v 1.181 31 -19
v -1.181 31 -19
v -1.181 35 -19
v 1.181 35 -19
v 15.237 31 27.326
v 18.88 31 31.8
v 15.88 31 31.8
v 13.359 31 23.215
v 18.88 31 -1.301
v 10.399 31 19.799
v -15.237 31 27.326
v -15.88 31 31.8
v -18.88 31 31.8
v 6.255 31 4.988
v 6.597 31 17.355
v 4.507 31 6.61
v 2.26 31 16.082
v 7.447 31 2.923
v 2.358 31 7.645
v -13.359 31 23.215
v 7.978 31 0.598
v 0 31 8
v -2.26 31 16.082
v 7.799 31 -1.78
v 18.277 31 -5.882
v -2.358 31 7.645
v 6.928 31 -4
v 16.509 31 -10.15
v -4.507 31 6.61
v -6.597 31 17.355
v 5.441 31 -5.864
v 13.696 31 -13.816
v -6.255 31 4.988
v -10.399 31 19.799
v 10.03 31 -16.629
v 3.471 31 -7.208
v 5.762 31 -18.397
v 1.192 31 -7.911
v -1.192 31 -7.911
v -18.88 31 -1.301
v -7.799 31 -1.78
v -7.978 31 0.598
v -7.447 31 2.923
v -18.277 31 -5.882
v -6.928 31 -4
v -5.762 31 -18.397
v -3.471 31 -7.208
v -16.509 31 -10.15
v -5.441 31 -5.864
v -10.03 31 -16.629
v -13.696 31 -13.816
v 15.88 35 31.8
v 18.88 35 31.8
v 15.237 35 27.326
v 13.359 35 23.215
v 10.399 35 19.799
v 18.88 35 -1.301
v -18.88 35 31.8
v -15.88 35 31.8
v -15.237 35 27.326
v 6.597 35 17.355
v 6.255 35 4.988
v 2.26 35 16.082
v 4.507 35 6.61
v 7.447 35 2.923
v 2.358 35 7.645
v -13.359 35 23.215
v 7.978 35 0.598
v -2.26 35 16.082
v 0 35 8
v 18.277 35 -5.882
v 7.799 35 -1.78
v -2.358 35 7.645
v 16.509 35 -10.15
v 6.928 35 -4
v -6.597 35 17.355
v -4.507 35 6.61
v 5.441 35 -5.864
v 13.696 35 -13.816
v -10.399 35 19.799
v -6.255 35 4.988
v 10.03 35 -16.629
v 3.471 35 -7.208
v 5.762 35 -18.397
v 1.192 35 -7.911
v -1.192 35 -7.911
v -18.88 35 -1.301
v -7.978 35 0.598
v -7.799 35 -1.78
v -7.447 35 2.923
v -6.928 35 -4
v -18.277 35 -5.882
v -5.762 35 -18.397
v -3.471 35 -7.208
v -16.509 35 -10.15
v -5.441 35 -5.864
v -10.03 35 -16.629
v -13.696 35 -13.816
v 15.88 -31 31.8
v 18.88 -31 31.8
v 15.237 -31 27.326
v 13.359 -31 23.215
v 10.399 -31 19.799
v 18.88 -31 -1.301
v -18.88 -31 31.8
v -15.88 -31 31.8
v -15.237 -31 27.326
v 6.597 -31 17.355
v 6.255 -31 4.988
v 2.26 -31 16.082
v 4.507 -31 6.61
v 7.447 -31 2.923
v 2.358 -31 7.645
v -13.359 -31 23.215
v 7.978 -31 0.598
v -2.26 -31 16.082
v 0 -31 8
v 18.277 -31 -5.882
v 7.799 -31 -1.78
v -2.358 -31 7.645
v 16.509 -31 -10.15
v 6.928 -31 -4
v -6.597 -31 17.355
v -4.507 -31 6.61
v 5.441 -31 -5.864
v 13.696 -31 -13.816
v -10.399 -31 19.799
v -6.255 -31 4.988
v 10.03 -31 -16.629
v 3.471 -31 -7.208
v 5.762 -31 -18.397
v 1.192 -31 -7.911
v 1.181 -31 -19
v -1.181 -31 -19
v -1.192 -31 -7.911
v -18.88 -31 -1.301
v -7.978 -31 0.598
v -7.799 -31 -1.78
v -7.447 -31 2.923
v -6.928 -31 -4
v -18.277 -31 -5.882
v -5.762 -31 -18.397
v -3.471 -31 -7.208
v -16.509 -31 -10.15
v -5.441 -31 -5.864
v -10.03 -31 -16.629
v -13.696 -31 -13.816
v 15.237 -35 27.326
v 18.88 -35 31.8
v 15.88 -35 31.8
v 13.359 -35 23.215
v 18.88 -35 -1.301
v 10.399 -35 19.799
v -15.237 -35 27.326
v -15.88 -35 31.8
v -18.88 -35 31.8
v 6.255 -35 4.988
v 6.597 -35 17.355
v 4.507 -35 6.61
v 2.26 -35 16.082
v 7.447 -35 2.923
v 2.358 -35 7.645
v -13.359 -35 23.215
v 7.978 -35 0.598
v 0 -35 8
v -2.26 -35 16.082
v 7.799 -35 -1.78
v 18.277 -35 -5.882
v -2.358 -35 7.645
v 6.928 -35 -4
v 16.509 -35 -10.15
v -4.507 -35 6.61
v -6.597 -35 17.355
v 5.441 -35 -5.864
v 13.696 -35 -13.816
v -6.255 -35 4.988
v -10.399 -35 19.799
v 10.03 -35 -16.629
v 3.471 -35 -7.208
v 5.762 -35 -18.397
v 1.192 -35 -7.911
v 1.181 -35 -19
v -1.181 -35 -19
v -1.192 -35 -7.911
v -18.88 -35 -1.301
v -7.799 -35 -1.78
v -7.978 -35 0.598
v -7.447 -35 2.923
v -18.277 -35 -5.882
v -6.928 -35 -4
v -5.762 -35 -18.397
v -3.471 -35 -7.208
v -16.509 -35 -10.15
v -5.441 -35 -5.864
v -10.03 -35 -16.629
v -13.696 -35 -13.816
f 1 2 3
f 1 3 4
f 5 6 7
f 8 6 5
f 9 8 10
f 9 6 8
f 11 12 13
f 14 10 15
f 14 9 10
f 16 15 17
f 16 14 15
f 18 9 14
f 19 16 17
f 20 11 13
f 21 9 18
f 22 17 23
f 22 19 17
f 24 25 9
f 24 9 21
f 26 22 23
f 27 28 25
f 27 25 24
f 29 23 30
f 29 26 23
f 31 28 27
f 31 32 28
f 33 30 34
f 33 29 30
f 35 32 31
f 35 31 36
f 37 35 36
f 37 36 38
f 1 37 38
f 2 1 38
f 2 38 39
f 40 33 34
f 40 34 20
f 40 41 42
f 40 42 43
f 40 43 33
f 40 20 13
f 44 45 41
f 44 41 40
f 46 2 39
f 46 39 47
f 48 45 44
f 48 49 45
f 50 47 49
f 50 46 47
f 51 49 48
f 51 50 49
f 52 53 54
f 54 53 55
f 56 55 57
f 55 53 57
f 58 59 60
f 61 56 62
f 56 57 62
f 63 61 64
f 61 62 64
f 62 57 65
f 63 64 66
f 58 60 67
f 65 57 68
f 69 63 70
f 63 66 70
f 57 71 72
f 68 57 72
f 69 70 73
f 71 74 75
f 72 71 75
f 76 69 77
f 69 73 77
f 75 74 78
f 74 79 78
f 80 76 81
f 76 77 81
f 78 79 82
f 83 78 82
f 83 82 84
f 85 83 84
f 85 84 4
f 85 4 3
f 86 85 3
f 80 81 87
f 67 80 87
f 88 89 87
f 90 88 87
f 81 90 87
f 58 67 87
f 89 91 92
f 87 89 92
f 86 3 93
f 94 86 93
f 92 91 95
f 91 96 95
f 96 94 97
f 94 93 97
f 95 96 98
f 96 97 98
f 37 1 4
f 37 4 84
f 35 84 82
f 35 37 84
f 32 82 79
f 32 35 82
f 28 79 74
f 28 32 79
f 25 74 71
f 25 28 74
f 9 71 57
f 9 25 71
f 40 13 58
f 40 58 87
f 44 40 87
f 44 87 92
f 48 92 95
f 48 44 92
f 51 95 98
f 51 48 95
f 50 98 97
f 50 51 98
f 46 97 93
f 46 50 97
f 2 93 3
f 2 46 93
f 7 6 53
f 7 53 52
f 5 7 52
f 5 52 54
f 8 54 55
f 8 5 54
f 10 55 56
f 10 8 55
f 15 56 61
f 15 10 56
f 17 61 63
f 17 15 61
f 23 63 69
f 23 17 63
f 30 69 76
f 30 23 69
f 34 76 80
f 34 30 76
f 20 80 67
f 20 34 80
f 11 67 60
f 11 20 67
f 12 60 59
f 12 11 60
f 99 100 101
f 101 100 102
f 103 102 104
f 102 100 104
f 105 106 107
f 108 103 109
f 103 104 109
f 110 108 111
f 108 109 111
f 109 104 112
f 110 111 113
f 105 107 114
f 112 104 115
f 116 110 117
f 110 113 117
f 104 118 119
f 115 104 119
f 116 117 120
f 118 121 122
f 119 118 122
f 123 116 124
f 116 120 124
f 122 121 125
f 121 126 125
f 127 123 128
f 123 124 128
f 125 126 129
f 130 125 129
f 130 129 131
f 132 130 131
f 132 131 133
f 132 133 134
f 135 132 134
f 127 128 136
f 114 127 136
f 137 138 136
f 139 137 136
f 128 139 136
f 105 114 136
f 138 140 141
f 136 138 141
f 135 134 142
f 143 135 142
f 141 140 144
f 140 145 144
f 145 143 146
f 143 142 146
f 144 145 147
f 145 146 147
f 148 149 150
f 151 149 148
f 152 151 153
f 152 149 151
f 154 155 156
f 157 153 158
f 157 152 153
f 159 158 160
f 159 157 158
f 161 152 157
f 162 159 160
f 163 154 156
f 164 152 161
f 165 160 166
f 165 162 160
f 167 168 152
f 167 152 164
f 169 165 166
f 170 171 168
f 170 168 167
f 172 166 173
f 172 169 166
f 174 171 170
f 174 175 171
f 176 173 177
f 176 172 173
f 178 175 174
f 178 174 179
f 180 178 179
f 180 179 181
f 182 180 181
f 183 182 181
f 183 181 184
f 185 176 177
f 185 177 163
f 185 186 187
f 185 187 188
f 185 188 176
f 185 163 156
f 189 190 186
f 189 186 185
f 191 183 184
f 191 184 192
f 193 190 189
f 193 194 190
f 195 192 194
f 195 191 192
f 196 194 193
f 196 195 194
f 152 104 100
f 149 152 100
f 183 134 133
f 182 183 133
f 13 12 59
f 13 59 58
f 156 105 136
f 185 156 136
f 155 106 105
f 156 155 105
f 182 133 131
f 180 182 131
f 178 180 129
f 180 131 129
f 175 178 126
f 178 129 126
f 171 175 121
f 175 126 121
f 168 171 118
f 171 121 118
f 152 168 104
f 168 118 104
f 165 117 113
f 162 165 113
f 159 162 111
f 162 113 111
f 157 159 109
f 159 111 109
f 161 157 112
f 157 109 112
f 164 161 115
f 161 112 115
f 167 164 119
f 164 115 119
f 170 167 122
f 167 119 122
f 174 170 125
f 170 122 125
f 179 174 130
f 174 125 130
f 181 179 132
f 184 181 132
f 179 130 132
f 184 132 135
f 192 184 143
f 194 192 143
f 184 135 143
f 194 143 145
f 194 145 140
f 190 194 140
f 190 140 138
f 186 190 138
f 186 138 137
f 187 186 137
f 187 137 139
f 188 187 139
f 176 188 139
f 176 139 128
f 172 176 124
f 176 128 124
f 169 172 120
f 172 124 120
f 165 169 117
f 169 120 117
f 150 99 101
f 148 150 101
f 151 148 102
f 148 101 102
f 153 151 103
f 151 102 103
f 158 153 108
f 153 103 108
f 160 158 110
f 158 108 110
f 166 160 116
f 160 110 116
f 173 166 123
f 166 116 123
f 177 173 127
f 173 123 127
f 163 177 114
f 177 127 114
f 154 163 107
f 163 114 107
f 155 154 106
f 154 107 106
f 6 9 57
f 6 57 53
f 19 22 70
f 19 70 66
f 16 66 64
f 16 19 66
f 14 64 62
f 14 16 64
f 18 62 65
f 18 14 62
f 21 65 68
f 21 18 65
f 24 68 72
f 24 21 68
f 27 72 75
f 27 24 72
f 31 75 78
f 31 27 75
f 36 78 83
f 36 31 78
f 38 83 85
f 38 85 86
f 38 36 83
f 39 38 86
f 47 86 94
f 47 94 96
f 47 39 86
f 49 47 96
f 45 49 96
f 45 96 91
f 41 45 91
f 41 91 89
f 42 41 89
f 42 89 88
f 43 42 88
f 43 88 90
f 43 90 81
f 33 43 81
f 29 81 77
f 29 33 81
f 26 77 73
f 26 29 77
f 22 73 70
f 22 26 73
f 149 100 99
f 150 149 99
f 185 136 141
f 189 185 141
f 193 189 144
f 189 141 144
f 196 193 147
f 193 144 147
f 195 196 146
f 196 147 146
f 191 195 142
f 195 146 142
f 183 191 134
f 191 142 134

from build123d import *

# Parameters (mm, degrees)
SKETCH1_R           = 8
BOSS_EXTRUDE1_DEPTH = 4


with BuildPart() as part:
    # Sketch1 → Boss-Extrude1 (new body)
    with BuildSketch(Plane(origin=(0, 31, 0), x_dir=(1, 0, 0), z_dir=(0, 1, 0))):
        with BuildLine():
            Line((18.88, -31.8), (15.88, -31.8))
            ThreePointArc((15.88, -31.8), (0, -15.92), (-15.88, -31.8))
            Line((-15.88, -31.8), (-18.88, -31.8))
            Line((-18.88, -31.8), (-18.88, 1.301))
            ThreePointArc((-18.88, 1.301), (-13.69608292, 13.81608292), (-1.181, 19))
            Line((-1.181, 19), (1.181, 19))
            ThreePointArc((1.181, 19), (13.69608292, 13.81608292), (18.88, 1.301))
            Line((18.88, 1.301), (18.88, -31.8))
        make_face()
        Circle(SKETCH1_R, mode=Mode.SUBTRACT)
    extrude(amount=BOSS_EXTRUDE1_DEPTH)


with BuildPart() as body_2:
    # Mirror1: mirrored copy
    add(part.part.mirror(Plane.ZX))


solid = Compound([part.part, body_2.part])
